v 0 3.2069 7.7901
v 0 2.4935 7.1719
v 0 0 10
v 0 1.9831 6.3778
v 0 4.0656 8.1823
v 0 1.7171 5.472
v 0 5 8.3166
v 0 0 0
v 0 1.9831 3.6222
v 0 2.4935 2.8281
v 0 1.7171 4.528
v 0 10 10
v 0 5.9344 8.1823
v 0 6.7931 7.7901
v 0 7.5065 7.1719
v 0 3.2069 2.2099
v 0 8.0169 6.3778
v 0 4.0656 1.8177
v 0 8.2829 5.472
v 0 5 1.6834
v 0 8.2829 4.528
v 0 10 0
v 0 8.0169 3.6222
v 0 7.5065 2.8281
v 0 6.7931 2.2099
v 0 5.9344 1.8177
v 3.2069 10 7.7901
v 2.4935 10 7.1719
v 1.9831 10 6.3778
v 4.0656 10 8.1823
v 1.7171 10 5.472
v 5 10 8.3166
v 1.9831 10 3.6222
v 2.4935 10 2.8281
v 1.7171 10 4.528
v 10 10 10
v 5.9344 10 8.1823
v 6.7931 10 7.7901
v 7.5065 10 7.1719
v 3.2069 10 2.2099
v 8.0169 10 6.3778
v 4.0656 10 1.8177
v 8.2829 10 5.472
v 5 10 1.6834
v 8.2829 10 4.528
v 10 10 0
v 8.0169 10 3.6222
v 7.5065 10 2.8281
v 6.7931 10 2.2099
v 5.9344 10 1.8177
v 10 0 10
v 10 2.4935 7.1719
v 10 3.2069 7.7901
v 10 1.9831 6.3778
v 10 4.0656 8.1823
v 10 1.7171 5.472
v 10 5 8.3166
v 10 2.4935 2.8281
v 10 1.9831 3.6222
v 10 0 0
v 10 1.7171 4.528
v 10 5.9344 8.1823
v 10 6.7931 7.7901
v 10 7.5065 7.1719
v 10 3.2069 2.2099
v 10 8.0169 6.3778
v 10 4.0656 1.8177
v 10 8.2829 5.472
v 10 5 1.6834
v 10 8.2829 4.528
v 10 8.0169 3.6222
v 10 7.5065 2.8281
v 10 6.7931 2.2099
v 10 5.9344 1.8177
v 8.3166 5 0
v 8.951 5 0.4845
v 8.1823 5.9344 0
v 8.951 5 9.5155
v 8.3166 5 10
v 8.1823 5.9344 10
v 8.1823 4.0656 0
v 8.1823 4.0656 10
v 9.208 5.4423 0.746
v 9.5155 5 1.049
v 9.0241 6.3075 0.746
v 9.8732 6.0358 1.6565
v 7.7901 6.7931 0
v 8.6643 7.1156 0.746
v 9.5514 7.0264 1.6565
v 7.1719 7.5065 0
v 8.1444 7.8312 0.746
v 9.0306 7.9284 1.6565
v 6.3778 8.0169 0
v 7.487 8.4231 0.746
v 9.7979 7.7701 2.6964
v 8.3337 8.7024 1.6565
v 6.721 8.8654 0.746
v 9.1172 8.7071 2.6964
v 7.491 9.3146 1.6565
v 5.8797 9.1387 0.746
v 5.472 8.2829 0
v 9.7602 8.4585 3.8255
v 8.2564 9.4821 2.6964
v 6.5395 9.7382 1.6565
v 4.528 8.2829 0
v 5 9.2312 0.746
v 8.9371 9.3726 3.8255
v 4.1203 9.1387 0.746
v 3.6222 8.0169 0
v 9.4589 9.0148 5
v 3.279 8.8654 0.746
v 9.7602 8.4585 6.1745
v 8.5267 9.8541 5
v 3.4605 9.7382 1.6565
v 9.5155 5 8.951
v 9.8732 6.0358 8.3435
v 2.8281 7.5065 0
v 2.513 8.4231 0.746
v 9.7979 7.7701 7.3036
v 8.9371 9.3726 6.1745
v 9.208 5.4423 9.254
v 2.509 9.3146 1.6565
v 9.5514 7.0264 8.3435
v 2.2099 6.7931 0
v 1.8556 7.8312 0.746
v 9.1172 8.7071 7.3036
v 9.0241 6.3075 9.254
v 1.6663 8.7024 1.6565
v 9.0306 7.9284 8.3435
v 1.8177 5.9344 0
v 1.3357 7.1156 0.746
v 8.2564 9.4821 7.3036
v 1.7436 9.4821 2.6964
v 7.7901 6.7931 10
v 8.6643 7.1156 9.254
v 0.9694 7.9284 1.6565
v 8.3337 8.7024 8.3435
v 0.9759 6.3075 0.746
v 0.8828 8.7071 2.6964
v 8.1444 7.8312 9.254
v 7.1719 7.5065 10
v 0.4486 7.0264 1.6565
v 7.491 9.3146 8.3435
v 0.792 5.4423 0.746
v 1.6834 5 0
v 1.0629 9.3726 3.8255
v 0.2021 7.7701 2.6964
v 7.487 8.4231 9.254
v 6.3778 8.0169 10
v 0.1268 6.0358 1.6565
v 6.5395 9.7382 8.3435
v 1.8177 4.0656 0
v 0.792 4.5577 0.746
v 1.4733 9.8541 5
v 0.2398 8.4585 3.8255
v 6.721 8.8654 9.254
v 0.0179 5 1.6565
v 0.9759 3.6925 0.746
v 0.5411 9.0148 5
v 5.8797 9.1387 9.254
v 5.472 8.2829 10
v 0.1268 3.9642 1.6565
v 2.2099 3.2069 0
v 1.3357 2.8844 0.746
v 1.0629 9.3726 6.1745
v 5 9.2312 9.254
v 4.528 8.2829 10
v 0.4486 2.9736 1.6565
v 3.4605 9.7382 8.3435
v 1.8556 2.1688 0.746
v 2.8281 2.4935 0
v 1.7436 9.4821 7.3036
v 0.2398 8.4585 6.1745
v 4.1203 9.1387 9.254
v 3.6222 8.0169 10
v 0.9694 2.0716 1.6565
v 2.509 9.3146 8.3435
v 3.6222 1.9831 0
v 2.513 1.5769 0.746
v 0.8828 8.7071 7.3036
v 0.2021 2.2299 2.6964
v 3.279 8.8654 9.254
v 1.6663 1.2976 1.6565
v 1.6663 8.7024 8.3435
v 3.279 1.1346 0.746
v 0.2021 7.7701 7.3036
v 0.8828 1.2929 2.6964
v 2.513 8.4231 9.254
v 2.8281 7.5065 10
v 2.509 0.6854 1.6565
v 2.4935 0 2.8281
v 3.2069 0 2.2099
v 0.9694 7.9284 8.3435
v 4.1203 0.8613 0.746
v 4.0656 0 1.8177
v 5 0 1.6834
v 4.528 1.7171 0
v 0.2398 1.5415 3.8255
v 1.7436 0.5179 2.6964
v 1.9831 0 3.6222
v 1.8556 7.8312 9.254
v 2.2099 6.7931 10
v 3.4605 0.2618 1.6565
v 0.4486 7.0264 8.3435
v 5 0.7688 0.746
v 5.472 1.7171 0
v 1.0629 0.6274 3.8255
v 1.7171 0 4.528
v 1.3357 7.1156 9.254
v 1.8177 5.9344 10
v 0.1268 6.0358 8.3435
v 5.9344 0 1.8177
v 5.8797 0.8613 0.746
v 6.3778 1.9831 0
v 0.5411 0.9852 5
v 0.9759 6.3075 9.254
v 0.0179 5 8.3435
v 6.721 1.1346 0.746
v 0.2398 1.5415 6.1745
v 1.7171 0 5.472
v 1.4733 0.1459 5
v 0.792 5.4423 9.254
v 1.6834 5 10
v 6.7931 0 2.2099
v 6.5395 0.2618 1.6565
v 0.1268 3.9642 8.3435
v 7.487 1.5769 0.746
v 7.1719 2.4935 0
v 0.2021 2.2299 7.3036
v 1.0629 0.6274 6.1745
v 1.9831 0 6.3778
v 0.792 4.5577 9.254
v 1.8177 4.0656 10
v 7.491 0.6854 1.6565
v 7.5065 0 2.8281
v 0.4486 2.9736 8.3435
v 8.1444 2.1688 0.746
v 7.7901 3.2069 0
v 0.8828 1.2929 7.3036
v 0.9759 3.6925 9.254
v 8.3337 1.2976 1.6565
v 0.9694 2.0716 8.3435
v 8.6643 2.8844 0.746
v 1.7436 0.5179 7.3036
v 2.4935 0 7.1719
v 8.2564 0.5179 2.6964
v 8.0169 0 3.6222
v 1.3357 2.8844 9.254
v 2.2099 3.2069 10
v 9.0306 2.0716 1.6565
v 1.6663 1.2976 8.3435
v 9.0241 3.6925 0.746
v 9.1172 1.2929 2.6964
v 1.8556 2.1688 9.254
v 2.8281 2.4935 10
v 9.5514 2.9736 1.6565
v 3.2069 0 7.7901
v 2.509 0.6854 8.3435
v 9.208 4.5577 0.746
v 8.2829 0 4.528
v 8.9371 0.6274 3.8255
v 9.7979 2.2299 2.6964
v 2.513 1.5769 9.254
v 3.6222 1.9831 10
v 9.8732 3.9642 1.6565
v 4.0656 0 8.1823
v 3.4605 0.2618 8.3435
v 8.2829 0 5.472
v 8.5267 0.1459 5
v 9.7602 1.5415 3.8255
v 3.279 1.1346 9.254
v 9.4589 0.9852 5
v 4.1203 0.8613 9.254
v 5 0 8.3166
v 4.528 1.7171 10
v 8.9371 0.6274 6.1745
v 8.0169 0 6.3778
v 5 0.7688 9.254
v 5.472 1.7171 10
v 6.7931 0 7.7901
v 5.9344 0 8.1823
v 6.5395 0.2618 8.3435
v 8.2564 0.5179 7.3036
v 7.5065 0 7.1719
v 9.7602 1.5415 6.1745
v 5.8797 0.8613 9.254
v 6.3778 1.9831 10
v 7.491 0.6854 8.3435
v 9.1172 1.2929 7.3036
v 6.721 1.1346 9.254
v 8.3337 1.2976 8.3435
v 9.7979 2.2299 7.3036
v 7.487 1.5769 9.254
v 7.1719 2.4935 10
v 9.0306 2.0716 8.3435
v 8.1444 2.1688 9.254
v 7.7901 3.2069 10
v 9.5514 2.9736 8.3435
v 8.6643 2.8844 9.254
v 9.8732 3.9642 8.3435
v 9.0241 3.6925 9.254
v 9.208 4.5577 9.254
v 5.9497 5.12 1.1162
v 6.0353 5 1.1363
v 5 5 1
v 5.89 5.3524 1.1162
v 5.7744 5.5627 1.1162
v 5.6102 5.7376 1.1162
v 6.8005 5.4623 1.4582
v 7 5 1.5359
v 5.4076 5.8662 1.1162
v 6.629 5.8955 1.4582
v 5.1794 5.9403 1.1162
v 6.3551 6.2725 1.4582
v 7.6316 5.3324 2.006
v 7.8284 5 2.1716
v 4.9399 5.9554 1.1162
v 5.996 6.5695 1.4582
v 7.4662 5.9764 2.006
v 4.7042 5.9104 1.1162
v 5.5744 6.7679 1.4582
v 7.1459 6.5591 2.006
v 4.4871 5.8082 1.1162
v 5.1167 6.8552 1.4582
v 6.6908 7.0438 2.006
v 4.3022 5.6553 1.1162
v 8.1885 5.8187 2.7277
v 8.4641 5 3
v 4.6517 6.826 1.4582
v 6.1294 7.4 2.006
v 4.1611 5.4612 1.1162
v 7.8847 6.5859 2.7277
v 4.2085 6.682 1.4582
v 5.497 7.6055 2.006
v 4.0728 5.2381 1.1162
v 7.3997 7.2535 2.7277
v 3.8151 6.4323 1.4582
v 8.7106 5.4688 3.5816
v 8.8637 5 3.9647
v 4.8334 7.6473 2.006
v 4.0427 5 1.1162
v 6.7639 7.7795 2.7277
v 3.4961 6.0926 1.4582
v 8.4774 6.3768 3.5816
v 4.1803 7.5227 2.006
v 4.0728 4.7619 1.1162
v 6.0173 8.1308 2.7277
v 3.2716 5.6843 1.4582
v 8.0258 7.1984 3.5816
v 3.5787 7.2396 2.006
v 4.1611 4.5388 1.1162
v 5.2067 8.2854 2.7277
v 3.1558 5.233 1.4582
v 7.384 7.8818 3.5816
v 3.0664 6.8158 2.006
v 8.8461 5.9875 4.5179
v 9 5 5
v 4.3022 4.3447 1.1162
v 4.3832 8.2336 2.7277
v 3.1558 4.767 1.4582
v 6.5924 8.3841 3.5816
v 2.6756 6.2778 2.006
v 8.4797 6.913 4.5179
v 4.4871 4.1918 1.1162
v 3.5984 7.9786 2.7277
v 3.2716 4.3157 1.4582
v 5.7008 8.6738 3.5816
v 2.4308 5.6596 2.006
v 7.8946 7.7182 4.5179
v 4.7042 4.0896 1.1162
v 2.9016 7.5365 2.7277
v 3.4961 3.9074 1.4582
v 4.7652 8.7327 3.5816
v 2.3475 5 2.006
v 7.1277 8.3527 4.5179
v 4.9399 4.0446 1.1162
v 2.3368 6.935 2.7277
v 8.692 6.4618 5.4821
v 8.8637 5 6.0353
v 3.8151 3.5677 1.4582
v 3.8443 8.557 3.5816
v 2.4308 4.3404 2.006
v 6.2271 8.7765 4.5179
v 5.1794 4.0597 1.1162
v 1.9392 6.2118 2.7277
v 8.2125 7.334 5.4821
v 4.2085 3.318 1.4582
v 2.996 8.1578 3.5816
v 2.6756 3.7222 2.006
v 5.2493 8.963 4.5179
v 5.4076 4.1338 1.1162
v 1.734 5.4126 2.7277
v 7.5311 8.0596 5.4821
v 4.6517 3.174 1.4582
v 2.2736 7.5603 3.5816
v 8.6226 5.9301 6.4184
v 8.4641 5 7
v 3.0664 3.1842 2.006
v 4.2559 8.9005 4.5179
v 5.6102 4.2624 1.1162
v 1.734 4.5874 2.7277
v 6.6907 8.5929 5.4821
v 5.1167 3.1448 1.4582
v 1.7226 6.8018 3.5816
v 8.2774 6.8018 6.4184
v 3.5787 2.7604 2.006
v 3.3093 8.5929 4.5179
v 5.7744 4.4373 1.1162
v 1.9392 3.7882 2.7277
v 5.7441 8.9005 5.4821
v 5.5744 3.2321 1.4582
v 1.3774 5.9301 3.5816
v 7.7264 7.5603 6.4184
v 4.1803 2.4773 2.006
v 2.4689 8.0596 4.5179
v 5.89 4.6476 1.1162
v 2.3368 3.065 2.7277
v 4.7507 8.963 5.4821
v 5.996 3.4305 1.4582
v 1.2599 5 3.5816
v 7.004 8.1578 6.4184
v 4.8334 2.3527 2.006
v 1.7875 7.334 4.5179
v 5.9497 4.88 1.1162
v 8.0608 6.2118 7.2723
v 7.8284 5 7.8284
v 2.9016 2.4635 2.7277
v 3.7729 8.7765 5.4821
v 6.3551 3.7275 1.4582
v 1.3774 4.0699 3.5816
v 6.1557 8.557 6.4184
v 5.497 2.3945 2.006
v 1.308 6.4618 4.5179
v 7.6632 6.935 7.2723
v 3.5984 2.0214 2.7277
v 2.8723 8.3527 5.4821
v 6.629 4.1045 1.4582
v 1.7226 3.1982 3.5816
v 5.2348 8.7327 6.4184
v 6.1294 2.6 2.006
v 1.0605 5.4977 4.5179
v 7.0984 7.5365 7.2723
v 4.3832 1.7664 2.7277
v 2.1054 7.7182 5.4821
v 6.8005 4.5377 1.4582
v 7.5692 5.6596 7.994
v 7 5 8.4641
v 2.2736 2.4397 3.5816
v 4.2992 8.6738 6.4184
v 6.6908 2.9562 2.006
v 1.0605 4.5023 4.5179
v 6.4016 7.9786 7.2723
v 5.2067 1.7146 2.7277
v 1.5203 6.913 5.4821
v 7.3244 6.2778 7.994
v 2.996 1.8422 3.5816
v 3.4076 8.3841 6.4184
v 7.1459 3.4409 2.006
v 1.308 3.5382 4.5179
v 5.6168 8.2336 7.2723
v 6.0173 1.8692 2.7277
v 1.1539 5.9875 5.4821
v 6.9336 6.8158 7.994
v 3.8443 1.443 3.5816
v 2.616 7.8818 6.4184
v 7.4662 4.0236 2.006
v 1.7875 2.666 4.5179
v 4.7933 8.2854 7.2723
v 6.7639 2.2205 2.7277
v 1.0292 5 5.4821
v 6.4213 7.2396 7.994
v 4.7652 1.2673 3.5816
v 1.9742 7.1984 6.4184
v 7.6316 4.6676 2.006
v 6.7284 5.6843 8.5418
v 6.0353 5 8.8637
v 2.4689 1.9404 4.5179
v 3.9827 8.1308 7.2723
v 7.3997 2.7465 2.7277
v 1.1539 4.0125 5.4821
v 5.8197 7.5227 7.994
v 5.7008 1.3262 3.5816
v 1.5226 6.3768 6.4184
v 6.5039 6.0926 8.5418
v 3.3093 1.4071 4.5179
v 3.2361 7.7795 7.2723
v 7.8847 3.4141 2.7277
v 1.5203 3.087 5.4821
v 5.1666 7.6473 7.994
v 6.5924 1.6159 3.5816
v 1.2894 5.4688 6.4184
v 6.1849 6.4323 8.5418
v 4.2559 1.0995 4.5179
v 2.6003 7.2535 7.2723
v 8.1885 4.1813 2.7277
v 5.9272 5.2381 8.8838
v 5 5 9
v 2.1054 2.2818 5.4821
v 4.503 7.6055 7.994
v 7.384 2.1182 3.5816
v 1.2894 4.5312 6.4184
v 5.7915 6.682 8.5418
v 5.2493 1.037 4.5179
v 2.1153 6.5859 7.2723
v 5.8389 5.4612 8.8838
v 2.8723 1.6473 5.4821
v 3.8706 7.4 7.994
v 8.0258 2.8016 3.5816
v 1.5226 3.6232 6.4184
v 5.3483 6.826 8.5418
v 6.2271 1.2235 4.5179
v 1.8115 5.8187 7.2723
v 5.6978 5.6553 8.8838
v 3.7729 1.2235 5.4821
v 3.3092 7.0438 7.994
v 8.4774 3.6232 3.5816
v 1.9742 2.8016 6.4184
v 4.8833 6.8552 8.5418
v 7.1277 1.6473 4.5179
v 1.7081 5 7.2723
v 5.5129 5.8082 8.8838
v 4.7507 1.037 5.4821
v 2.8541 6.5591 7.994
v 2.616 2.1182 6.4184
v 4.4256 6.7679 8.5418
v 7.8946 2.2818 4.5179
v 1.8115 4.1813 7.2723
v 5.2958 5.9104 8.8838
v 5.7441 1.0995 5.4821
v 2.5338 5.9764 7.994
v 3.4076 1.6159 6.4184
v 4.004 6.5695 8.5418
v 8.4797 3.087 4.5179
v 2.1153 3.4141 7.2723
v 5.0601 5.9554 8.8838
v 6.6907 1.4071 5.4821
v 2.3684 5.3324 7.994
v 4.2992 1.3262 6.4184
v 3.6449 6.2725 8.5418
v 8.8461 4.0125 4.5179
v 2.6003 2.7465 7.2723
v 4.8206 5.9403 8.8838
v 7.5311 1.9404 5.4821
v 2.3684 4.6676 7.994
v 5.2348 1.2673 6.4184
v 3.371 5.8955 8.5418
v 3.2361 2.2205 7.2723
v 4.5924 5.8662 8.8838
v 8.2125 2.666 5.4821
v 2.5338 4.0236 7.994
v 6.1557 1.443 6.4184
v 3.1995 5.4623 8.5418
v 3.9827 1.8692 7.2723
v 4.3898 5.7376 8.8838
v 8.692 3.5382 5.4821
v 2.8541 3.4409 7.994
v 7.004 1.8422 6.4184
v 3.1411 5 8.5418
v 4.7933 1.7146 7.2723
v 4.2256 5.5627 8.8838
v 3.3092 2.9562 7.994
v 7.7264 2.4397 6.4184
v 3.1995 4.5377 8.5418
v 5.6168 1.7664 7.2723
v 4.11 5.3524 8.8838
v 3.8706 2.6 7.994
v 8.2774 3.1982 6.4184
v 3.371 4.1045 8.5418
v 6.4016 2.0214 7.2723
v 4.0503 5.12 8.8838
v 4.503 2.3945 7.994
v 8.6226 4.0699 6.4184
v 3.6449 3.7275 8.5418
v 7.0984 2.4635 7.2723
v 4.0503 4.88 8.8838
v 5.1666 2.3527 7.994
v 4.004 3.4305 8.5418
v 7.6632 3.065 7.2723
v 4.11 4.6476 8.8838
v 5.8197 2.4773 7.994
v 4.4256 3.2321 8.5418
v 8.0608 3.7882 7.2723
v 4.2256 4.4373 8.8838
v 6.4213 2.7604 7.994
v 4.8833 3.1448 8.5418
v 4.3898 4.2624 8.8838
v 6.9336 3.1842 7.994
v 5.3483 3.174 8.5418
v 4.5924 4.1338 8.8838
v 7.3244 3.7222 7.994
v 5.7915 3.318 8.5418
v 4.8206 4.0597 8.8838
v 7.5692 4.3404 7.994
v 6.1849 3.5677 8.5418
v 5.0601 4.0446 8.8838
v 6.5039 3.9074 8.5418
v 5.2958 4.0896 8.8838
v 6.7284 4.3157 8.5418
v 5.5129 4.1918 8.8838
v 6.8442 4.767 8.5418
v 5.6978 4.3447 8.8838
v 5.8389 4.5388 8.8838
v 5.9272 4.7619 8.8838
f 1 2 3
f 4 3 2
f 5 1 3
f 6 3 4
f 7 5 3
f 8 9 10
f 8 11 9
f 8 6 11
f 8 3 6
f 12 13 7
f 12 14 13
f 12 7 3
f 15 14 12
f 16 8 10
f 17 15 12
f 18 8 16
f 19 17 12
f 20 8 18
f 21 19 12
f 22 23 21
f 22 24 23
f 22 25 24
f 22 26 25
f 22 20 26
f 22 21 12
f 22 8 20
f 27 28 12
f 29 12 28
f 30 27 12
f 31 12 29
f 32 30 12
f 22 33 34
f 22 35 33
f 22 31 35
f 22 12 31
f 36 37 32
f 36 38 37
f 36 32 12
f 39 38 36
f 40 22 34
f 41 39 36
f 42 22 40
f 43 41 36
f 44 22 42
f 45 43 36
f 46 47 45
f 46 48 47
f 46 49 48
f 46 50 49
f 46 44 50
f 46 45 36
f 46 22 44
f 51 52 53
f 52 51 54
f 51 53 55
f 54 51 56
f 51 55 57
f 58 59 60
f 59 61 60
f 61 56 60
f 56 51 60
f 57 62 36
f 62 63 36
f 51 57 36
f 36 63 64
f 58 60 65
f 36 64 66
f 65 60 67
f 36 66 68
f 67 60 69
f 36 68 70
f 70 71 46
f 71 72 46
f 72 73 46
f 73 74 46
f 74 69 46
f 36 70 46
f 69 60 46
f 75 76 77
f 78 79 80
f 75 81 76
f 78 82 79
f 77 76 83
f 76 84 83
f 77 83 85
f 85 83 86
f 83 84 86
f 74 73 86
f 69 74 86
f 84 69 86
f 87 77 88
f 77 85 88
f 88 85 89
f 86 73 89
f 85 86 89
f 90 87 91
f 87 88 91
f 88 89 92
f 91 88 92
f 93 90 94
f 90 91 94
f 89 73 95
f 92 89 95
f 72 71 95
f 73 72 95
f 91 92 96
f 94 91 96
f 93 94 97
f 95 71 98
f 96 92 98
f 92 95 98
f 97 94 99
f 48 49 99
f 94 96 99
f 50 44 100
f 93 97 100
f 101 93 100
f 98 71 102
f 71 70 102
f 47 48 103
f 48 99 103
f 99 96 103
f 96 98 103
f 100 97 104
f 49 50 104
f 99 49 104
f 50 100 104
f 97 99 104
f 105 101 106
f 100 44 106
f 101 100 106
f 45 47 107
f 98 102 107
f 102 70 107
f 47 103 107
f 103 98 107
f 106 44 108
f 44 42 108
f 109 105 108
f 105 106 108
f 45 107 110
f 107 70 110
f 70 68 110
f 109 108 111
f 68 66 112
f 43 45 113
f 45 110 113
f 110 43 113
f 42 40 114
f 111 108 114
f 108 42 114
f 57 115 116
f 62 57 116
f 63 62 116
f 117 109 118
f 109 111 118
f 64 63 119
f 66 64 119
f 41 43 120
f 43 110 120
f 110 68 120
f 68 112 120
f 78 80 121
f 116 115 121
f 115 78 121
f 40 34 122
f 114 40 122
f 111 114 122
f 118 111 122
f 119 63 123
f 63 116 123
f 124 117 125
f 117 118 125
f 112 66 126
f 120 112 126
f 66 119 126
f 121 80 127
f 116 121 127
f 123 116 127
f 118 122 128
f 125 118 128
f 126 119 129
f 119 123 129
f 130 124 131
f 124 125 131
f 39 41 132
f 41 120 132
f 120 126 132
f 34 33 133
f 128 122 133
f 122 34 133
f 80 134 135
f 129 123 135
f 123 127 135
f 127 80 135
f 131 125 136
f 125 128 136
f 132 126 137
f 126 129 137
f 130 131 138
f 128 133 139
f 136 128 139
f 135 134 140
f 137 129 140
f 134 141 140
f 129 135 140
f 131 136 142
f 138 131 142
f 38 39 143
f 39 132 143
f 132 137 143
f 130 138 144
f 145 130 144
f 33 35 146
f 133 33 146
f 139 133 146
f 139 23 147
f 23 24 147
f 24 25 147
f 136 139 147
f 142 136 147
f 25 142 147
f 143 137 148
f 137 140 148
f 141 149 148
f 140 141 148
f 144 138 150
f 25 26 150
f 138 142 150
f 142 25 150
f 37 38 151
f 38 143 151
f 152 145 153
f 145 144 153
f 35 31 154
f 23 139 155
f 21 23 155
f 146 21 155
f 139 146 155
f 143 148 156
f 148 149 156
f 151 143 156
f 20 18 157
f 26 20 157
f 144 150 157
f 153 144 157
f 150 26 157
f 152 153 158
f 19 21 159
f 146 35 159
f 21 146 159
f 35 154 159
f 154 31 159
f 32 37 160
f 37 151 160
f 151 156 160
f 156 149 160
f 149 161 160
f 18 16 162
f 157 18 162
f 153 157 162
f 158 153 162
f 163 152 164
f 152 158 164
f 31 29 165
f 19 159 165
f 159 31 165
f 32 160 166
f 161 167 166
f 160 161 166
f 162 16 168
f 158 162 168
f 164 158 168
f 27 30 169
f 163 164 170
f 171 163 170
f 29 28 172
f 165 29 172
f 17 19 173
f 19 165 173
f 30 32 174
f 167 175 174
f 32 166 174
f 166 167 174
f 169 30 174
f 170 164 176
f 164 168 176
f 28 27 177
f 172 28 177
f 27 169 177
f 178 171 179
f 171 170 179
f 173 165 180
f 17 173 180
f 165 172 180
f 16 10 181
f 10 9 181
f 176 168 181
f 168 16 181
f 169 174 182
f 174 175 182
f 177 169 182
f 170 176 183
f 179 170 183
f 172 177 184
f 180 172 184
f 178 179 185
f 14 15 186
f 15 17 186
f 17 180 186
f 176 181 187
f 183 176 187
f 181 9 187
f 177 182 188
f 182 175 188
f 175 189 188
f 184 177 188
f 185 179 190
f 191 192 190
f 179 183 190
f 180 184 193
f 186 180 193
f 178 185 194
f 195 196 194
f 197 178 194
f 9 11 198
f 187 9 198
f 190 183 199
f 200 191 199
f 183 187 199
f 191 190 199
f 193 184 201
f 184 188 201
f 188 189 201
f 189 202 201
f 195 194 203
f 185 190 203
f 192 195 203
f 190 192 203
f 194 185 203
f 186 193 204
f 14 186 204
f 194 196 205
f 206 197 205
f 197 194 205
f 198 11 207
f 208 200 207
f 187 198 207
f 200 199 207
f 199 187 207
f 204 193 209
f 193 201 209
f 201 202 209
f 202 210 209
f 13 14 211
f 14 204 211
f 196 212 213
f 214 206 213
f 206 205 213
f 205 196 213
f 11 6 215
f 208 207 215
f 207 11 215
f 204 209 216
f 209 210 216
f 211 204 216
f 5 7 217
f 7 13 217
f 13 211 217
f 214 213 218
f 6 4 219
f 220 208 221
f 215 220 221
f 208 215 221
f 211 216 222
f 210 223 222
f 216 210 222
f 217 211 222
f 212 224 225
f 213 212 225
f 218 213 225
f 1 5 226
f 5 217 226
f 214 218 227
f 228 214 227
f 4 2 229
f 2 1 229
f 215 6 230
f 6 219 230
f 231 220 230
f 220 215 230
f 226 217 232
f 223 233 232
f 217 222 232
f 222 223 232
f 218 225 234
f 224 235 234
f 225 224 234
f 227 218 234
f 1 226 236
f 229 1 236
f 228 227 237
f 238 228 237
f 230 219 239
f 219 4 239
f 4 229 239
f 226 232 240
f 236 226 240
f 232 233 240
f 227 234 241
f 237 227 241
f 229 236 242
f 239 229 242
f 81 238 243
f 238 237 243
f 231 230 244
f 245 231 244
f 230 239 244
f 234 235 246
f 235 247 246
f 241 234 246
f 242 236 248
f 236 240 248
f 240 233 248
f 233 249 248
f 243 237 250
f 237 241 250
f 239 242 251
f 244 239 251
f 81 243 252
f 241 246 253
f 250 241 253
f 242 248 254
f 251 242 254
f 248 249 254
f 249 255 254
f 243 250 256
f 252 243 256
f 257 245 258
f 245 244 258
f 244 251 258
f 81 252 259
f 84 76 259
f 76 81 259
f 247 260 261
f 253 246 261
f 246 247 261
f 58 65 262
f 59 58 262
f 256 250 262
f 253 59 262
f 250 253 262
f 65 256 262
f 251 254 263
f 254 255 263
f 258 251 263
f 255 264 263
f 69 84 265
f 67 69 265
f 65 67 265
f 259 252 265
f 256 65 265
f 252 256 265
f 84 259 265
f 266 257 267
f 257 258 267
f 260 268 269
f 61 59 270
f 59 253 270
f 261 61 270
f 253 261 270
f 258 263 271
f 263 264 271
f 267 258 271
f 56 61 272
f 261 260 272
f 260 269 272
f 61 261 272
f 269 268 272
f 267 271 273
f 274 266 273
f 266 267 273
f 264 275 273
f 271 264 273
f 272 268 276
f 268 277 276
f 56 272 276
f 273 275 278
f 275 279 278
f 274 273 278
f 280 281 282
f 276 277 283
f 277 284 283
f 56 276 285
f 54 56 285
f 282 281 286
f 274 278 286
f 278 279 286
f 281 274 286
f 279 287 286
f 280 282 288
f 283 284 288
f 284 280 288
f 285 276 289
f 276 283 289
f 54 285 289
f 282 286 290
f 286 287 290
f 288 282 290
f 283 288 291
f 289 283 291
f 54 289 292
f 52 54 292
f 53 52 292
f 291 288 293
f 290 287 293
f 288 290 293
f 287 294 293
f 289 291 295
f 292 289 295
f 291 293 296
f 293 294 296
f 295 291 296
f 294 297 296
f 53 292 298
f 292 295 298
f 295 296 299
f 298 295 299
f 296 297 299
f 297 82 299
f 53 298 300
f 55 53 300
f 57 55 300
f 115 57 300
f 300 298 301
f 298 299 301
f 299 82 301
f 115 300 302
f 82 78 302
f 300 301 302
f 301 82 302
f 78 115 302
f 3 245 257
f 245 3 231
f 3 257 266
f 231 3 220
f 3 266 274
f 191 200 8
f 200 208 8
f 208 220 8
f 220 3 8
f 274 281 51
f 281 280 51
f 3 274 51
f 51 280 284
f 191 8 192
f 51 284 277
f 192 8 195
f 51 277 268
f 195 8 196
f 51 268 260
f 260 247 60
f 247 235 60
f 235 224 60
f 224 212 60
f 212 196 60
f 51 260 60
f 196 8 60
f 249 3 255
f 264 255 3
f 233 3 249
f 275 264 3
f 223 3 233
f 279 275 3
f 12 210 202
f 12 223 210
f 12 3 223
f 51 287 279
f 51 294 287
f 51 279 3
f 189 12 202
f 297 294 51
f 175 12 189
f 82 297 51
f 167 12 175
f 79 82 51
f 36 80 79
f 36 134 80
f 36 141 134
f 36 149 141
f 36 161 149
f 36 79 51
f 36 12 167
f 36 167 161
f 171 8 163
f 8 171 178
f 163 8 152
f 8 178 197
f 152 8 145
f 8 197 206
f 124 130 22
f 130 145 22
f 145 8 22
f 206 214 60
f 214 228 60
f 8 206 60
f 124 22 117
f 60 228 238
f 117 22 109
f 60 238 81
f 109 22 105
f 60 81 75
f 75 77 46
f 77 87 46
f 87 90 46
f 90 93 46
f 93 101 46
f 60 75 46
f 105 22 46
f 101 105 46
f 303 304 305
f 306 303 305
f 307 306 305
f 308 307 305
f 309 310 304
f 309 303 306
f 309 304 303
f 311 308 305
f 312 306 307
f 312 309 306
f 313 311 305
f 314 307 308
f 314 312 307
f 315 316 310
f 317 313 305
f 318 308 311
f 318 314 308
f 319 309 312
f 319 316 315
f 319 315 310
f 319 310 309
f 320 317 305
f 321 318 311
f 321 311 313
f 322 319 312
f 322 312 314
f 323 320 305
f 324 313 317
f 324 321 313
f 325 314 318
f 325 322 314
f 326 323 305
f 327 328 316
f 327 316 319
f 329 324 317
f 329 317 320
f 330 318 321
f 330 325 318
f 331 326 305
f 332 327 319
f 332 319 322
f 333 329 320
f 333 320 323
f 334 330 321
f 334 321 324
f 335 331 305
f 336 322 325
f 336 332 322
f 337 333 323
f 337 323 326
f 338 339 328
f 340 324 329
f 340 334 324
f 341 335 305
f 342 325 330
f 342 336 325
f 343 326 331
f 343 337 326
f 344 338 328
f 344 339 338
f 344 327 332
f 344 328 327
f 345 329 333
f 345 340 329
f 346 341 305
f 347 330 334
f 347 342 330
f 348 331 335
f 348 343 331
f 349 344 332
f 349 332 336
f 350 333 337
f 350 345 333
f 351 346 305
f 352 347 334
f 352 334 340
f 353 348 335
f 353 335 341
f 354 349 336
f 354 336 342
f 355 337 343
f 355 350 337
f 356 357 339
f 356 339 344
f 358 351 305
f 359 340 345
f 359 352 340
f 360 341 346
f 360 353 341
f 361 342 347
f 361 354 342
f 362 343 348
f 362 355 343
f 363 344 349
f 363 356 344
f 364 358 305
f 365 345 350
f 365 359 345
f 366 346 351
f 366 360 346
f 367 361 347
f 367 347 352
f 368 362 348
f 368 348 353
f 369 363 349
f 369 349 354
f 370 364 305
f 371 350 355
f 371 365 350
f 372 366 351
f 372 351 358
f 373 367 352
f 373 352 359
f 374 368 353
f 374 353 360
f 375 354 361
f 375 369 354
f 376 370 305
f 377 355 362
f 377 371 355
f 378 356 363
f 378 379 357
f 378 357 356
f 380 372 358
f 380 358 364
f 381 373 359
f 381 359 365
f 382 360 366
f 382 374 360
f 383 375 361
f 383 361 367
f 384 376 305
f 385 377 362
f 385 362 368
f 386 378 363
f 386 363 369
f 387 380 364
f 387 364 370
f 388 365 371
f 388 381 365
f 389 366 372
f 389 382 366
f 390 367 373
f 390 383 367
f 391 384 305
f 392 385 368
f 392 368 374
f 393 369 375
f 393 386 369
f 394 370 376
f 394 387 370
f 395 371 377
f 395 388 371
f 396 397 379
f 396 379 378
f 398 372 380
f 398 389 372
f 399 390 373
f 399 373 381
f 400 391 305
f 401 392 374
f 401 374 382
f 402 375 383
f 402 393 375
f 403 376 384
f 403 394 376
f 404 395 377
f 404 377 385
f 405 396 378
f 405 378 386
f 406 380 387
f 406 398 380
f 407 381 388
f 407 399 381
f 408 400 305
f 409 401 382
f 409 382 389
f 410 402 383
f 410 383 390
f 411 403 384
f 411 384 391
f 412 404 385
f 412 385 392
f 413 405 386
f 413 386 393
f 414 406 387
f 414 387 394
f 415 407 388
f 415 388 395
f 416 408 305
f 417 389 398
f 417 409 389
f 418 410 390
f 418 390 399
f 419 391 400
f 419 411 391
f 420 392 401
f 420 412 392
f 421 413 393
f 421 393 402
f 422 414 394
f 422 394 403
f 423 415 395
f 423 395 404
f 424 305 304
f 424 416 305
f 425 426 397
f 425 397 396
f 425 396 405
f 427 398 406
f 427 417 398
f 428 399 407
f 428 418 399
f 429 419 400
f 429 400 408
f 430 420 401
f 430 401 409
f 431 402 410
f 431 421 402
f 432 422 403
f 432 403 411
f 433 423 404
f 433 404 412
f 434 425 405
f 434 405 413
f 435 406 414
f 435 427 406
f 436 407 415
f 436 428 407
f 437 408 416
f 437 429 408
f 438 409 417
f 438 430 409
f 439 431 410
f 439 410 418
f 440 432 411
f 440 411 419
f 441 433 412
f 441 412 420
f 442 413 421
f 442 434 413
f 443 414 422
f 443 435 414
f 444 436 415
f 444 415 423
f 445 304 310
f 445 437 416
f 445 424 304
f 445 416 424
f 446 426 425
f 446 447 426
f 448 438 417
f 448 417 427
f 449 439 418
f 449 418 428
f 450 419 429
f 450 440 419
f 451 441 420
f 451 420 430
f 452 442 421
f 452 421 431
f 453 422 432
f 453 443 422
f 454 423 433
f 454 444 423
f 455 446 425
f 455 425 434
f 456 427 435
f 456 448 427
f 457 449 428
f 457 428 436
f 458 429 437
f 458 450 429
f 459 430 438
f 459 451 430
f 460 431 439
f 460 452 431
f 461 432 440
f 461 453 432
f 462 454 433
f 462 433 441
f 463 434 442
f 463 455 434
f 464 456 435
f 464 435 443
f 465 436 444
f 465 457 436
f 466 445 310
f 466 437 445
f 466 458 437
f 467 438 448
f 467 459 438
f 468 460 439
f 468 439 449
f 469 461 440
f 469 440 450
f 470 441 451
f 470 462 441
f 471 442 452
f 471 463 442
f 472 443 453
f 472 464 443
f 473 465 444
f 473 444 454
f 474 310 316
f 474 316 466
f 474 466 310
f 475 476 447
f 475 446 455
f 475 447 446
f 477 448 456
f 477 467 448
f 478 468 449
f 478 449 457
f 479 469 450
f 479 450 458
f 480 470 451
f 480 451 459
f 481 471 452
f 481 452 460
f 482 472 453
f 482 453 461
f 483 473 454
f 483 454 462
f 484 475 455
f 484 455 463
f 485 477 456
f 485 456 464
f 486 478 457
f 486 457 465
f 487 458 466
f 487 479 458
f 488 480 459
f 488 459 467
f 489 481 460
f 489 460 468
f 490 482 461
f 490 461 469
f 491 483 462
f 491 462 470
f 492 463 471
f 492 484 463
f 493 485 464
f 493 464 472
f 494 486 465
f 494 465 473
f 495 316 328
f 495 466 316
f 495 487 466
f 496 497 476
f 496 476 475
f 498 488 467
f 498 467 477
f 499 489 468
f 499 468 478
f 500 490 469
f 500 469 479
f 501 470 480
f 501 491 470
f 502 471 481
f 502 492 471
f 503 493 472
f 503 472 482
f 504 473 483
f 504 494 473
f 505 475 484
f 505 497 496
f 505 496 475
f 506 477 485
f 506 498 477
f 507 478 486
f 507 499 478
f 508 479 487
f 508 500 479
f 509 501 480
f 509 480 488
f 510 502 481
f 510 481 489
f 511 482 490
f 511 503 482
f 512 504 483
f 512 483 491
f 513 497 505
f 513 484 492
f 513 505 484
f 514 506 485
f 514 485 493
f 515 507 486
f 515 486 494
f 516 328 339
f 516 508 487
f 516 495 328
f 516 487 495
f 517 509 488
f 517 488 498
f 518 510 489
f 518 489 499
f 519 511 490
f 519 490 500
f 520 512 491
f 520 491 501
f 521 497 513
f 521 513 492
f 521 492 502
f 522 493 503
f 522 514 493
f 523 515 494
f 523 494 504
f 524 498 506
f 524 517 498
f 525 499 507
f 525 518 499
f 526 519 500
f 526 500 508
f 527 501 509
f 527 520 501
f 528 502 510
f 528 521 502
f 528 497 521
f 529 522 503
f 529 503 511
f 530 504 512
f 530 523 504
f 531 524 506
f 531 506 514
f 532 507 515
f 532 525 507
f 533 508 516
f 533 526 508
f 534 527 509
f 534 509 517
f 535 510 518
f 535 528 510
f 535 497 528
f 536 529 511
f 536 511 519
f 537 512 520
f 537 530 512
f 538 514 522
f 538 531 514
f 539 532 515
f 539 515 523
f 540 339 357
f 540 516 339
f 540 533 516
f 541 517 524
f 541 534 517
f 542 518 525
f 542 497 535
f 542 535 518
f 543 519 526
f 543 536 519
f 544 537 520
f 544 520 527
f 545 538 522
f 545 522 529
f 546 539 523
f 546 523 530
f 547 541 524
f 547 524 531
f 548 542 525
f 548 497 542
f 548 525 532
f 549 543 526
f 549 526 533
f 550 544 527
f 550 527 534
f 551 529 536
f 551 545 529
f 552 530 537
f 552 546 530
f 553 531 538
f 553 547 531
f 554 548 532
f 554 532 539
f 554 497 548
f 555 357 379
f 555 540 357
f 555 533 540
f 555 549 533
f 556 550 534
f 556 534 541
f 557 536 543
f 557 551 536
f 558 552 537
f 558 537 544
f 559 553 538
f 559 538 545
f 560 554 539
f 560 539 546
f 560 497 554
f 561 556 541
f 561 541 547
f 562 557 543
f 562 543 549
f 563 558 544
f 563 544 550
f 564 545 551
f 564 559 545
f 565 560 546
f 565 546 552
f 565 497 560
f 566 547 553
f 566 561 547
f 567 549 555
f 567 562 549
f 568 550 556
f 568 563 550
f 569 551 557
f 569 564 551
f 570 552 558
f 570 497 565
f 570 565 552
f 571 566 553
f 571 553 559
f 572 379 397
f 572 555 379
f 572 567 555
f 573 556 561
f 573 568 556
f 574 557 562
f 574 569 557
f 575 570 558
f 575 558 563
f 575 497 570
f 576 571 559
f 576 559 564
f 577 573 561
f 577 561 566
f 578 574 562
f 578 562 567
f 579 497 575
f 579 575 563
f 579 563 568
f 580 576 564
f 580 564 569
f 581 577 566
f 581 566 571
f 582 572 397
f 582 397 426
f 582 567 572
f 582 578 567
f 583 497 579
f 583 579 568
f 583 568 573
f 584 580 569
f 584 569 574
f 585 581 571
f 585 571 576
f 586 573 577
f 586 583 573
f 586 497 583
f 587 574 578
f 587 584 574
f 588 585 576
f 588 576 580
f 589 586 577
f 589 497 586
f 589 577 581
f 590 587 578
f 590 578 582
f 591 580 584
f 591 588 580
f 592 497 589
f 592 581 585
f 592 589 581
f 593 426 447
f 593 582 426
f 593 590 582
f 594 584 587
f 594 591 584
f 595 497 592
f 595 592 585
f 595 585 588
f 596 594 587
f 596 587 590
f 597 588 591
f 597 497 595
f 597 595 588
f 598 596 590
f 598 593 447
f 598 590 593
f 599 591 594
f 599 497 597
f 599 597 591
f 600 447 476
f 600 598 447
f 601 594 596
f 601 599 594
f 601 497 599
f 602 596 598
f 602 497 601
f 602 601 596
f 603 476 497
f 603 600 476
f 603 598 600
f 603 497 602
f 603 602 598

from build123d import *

# Parameters (mm, degrees)
BOX_W     = 10
BOX_H     = 10
BOX_DEPTH = 10


with BuildPart() as sphere:
    # Sphere → Sphere (revolve)
    with BuildSketch(Plane(origin=(5, 5, 5), x_dir=(1, 0, 0), z_dir=(0, -1, 0))):
        with BuildLine():
            ThreePointArc((0, -6), (6, 0), (0, 6))
            Line((0, 6), (0, -6))
        make_face()
    revolve(axis=Axis((5, 5, 5), (0, 0, 1)))


with BuildPart() as cut:
    # Box → Box (new body)
    with BuildSketch(Plane.XY):
        with Locations((5, 5)):
            Rectangle(BOX_W, BOX_H)
    extrude(amount=BOX_DEPTH)

    # Cut: cut Sphere
    add(sphere.part, mode=Mode.SUBTRACT)


with BuildPart() as sphere001:
    # Sphere001 → Sphere001 (revolve)
    with BuildSketch(Plane(origin=(5, 5, 5), x_dir=(1, 0, 0), z_dir=(0, -1, 0))):
        with BuildLine():
            ThreePointArc((0, -4), (4, 0), (0, 4))
            Line((0, 4), (0, -4))
        make_face()
    revolve(axis=Axis((5, 5, 5), (0, 0, 1)))


solid = Compound([cut.part, sphere001.part])
